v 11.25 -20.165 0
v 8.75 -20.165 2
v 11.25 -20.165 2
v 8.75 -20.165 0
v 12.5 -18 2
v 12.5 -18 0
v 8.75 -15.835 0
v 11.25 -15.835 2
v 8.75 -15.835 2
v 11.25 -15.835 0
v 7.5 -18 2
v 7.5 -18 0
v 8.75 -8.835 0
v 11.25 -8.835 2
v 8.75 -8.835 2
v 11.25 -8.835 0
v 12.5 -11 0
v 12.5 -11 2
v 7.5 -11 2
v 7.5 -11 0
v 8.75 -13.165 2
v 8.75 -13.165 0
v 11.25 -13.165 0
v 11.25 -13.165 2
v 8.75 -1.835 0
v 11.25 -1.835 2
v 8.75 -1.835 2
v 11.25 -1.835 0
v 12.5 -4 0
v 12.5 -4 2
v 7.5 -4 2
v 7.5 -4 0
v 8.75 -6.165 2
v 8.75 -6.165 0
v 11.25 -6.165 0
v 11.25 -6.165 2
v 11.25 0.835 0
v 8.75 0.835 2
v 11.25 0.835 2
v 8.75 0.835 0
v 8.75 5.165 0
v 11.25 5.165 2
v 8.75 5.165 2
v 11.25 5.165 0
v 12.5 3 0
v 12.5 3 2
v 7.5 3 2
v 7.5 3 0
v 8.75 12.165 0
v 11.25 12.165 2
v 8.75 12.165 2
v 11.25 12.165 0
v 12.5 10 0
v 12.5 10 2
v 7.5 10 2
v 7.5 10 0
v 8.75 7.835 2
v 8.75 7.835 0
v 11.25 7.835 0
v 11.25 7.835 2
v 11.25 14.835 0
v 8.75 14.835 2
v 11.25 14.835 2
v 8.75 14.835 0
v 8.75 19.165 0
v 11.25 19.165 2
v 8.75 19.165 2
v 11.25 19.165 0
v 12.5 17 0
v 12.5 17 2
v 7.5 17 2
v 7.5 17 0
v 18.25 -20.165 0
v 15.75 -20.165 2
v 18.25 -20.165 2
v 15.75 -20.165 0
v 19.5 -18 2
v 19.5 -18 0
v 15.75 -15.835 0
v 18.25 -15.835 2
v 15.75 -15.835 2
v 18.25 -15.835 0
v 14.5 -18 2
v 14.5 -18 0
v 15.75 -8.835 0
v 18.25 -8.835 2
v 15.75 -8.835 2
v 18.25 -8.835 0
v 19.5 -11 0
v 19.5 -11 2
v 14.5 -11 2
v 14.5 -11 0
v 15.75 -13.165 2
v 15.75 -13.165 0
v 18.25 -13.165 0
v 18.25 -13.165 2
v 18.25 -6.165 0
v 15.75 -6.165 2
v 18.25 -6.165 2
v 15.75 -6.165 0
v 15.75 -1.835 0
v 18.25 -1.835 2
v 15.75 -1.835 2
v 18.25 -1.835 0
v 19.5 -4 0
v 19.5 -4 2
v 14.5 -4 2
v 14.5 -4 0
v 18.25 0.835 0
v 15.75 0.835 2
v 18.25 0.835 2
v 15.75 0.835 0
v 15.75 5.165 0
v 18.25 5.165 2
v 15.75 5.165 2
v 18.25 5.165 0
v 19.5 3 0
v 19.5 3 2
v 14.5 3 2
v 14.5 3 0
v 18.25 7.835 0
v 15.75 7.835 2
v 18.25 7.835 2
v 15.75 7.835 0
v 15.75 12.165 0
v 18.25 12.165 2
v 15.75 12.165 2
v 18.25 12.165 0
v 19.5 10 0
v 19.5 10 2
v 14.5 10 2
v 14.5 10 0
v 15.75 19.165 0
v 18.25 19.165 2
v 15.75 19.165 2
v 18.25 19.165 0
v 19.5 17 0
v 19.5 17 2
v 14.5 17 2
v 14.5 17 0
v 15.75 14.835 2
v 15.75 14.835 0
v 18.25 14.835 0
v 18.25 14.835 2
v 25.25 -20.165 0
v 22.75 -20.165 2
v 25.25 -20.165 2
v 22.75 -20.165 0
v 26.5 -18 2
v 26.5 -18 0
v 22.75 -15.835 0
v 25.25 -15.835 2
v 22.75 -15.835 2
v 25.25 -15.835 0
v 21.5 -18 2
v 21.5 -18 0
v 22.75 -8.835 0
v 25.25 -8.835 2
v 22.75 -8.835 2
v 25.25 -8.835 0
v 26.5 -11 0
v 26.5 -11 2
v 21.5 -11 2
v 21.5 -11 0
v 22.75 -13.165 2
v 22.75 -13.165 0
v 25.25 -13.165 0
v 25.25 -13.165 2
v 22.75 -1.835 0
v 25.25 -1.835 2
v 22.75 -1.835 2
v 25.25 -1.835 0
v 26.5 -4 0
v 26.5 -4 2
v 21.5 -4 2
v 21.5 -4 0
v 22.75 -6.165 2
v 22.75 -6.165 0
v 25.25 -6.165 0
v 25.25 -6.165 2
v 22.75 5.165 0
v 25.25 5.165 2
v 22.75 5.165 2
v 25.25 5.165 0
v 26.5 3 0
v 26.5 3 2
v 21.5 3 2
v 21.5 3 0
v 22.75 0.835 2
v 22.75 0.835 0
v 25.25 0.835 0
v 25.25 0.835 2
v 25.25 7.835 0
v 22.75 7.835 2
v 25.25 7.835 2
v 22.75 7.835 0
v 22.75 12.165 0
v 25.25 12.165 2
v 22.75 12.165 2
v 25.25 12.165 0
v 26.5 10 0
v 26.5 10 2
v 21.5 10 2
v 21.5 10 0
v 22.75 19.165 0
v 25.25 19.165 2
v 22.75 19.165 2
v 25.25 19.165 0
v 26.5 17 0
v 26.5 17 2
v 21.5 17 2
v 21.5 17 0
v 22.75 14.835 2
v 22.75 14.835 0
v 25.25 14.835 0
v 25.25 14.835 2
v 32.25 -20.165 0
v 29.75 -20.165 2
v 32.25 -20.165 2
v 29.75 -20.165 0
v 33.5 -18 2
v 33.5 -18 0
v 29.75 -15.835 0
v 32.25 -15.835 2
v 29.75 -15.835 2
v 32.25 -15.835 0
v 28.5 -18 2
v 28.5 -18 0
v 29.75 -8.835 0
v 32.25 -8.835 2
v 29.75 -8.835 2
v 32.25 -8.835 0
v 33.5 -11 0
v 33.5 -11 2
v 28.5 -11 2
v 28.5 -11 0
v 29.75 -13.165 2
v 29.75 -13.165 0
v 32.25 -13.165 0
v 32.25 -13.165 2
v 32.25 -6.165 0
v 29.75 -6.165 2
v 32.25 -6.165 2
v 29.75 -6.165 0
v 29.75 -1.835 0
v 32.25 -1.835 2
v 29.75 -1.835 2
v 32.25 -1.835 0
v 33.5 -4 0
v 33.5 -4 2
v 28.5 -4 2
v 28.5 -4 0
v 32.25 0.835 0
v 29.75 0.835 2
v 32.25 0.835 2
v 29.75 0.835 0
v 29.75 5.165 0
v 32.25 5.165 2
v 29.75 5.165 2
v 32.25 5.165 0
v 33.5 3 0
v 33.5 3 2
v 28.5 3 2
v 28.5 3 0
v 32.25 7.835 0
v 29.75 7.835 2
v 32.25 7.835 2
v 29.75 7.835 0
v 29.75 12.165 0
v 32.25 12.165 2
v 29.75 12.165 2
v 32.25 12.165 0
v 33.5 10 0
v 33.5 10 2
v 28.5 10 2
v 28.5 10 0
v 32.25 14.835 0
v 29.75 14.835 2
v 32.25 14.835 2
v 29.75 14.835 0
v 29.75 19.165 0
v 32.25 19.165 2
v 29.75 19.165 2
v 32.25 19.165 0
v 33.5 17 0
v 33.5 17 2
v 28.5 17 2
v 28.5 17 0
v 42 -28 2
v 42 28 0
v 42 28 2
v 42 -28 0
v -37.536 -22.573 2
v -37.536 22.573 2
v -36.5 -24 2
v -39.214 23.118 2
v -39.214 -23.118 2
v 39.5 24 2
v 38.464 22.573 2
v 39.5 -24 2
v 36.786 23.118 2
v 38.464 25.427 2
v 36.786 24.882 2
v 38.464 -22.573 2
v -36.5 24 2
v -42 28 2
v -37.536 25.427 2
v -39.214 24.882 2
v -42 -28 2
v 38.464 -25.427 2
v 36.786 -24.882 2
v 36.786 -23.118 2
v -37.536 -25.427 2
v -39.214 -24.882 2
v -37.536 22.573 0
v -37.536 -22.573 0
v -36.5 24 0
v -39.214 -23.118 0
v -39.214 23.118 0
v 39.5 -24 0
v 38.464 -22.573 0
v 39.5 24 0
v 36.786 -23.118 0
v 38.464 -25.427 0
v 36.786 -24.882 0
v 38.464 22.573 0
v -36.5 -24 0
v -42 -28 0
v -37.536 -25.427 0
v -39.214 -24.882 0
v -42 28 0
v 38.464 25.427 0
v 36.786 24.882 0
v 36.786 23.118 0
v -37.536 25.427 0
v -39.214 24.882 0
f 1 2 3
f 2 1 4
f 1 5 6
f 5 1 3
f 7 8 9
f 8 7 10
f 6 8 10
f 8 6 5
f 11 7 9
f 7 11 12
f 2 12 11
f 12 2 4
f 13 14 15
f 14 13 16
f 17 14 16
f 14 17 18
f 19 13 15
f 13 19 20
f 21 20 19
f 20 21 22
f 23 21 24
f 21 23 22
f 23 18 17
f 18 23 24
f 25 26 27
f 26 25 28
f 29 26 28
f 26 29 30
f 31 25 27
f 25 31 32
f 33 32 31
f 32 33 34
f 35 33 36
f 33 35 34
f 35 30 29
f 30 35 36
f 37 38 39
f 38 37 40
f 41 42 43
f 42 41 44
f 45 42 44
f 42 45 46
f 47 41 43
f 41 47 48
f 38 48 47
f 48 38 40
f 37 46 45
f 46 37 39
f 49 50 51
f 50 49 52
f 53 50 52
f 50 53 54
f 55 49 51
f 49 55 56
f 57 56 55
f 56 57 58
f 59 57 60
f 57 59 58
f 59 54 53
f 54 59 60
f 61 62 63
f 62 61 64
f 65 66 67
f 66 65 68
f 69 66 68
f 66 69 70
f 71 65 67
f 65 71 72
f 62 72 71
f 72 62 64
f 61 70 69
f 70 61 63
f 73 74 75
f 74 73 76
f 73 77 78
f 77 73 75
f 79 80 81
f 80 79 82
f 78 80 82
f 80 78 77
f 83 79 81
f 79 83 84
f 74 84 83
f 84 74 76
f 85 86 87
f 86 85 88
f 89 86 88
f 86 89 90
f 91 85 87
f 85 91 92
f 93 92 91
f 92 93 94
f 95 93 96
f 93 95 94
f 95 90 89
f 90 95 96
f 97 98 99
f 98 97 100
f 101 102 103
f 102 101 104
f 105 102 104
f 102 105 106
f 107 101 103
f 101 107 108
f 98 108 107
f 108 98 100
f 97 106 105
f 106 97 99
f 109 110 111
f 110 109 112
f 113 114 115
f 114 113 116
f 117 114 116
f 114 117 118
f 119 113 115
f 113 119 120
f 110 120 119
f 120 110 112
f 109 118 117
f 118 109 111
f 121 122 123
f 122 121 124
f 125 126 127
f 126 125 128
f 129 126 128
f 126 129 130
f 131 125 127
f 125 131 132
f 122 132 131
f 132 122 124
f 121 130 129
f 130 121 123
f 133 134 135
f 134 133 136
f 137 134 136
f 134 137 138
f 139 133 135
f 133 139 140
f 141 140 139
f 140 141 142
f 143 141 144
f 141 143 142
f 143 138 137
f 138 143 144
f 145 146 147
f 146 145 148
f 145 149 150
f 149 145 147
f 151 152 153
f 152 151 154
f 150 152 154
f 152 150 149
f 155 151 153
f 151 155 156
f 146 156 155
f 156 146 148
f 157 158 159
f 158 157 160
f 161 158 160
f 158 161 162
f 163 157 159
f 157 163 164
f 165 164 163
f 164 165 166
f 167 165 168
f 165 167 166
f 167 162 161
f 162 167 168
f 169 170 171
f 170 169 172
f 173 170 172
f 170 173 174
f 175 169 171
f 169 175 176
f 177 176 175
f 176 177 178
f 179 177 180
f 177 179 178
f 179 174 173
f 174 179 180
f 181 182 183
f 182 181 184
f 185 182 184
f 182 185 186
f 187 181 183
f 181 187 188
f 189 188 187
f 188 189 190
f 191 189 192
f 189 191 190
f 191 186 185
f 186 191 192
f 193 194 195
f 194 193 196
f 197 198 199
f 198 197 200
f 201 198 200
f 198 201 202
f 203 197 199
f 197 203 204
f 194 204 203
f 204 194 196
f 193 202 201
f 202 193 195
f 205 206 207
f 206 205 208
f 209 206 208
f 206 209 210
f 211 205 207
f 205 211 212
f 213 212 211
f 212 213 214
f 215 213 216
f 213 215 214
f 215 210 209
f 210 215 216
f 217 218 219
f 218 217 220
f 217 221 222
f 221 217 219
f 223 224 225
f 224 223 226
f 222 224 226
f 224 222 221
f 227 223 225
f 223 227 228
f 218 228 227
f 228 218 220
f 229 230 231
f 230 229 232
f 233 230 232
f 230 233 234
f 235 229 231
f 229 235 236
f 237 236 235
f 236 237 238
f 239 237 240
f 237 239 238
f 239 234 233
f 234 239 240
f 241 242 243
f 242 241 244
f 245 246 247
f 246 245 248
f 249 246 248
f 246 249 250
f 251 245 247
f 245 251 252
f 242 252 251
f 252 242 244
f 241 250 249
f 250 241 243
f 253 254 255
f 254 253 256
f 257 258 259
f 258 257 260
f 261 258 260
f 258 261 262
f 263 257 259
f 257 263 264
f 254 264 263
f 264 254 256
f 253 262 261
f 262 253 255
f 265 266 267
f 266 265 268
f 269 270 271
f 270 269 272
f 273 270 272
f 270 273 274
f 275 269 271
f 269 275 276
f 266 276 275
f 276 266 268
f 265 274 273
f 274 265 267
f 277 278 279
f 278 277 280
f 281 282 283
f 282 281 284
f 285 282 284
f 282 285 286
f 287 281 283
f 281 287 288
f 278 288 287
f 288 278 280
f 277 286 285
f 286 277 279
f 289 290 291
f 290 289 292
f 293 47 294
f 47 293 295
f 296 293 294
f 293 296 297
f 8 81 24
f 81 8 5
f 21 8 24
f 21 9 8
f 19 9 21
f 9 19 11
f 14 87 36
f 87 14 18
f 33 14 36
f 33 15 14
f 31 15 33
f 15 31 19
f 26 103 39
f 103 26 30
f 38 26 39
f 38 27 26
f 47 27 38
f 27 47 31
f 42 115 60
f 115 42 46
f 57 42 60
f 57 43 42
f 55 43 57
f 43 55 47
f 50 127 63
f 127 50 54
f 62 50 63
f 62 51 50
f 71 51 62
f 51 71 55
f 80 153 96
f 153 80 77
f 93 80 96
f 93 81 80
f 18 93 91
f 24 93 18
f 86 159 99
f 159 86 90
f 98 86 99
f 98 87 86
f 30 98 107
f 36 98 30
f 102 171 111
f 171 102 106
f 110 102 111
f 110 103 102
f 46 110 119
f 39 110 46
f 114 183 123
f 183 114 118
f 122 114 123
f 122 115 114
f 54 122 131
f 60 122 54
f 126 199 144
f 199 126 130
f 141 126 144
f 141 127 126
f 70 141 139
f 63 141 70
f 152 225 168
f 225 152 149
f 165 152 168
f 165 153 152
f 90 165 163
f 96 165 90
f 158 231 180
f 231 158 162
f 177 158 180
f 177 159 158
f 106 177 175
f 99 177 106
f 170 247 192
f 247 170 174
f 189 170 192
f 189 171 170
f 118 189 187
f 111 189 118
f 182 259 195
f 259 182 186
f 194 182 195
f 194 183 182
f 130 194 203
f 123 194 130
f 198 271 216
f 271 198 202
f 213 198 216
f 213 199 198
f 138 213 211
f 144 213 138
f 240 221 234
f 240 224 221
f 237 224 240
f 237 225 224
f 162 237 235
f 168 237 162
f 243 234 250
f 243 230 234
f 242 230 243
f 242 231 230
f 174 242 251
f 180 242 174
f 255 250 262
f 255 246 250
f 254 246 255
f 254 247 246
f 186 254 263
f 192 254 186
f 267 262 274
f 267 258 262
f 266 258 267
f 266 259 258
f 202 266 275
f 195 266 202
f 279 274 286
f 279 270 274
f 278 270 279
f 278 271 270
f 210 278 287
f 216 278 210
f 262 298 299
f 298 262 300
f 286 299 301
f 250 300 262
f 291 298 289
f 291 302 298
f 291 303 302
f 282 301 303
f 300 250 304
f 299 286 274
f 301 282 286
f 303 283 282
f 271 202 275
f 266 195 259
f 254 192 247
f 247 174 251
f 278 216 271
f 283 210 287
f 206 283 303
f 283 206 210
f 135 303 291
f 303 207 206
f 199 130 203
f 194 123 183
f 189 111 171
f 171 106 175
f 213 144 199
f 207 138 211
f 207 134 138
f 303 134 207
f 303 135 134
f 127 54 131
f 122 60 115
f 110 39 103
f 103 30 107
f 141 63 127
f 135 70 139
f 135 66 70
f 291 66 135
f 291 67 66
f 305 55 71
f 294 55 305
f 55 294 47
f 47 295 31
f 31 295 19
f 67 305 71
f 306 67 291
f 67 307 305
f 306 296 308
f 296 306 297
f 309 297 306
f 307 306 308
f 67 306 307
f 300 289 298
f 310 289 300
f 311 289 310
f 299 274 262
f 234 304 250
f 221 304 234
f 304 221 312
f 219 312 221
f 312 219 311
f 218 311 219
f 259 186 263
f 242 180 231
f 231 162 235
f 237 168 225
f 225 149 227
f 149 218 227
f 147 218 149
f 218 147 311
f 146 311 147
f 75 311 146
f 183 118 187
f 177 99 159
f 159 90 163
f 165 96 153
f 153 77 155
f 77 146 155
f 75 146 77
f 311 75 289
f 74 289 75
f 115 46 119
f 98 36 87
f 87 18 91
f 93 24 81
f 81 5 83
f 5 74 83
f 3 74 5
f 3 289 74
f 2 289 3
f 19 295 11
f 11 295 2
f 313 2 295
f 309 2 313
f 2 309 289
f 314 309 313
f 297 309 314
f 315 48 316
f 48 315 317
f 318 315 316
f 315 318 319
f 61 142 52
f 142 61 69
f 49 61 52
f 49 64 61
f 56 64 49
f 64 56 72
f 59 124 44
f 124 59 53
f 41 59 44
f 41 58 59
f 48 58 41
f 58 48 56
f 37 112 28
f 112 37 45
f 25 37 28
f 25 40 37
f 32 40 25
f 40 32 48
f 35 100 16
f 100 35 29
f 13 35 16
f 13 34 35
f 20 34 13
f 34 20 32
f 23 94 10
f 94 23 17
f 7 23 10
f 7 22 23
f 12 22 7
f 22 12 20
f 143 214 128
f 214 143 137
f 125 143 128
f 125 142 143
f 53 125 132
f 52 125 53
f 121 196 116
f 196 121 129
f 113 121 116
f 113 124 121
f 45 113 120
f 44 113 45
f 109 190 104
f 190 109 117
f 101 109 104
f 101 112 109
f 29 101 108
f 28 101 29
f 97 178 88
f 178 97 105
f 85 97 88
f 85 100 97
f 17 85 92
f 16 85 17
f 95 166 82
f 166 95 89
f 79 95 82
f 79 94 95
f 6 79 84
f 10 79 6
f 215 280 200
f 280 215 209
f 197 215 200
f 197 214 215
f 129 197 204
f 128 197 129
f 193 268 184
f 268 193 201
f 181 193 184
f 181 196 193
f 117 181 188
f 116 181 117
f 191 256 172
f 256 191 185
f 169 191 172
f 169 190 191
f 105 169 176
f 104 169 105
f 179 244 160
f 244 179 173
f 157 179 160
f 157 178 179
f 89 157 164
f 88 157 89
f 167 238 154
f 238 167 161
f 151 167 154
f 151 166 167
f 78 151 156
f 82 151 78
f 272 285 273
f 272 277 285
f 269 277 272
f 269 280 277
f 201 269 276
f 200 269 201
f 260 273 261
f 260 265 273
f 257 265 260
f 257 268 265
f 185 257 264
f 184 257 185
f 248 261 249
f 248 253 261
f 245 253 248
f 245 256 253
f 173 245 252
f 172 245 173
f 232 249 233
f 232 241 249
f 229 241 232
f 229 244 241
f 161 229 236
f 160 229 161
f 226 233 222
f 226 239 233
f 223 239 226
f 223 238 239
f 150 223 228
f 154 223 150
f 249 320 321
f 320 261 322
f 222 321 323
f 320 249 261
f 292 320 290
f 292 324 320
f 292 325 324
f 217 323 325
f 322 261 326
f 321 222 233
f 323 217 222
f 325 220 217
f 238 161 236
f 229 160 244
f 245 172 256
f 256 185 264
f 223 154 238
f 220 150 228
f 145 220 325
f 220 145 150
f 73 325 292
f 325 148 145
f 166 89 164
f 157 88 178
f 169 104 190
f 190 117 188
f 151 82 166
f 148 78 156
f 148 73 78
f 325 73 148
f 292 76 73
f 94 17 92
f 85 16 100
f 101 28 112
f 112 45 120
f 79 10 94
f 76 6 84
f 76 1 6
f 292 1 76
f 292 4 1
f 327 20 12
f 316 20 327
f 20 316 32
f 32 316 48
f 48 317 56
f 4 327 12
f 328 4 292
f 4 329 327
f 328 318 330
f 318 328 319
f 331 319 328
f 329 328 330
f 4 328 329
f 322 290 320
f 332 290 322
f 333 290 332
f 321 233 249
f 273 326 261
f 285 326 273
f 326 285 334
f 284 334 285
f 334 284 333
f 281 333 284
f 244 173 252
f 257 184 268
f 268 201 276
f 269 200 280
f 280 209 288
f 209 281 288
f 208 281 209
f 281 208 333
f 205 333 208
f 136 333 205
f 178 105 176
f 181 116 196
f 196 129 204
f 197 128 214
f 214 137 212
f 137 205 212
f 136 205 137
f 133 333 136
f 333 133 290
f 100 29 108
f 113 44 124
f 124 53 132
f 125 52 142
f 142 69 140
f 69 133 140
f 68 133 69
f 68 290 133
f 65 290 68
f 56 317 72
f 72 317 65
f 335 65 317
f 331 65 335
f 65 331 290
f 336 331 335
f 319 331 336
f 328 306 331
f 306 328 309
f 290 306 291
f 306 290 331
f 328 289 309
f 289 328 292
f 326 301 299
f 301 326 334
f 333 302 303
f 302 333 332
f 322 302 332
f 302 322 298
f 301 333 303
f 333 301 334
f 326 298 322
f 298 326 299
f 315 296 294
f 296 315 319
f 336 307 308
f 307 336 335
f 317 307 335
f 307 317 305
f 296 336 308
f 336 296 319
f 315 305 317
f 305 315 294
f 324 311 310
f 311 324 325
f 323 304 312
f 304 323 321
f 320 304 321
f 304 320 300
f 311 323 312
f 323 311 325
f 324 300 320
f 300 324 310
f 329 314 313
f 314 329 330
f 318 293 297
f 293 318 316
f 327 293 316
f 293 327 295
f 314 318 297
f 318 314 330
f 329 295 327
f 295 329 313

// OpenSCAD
top = 1; // 0-box only, 1-top only, 2-both  
mountsV=0; // enable vertical mounts
mountsH=0; // enable horisontal mounts
len = 80;   // internal length
width = 52;	 // internal width
height = 32; // internal height

p = 2;   // walls thickness
d = 6;   // racks diameter
k1 = 16; // diameter of hole in the racks
d1 = 3;  // depth of the hole in the racks

mLen = 12.5; 	// mounts length
mHeigh = 12.5; // mounts width
mHd = 3; 		// diameter of hole in the mounts

ghd = 5;  // gril hole diameter
ghs = 2; // gril hole space
ghr = 6; // gril hole resolution 3::8

module mount()
{
  	difference()
  	{
   	union()
  	  {
  		 cube([mLen - mHeigh / 2, mHeigh, p]);
		 translate([(mLen - mHeigh /2), mHeigh /2, 0])
  		 cylinder(p, d = mHeigh);
     }
 	  translate([(mLen - mHeigh /2), mHeigh /2, 0])
  	  cylinder(p, d = mHd);
   }
}

module mounp_pos(pos)
{
   if(pos == 0)
   {
   	rotate(180, 0, 0)
		translate([ (len + p) / 2, (-mHeigh/2), -(height+p) / 2])
		mount();
   } else if(pos == 1)
   {
   	rotate(90, 0, 0)
		translate([ (width + p) / 2, (-mHeigh/2), -(height+p) / 2])
		mount();
   } else if(pos == 2)
   {
   	translate([ (len + p) / 2, (-mHeigh/2), -(height+p) / 2])
		mount();
   } else if(pos == 3)
   {
  	   rotate(-90, 0, 0)
   	translate([ (width + p) / 2, (-mHeigh/2), -(height+p) / 2])
		mount();
   }
}

module corn(x, y)
{
  translate([(len/2 -d /3) * x, (width/2 - d/3) * y, p * 2])
  	difference()
  	{
 		cylinder(h = height/1.25, d = d, center=true);
   	translate([0, 0, height - k1])
  		cylinder(h = k1*2, d = d1, center=true);
   }
}


module box()
{
union() {  
   difference() {
 		cube([len + p * 2, width + p * 2, height + p], center = true);
		translate([0, 0, p]) {
	 		cube([len, width, height], center = true);
		}
  }
	corn(1, 1);
	corn(-1, 1);
	corn(1, -1);
	corn(-1, -1);
   if(mountsV)
   {
   	mounp_pos(0);
   	mounp_pos(2);
   }
   if(mountsH)
   {
   	mounp_pos(1);
   	mounp_pos(3);
	}
 }
}


module box_hole(x,y)
{
	translate([(len/2 -d /3) * x, (width/2 - d/3) * y, 0])
  		cylinder(h = p + 0.5, d = d1, center=true);
}

module gril(l, w)
{
	
	for(i = [0: ghd + ghs:l - ghd])
	{
		for(j = [0: ghd + ghs: w - ghd])
		{
			translate([i, j, 0])
				cylinder(h = k1*20, d = ghd, center=true, $fn=ghr);	
		}
	}
} 

module box_top() 
{
   difference() {
 		cube([len + p * 2, width + p * 2, p], center = true);
		box_hole(1, 1);
		box_hole(-1, 1);
		box_hole(1, -1);
		box_hole(-1, -1);
		if(ghd > 0) {
			translate([10, -18, 0]) gril(len / 3, 40);
		}
   }
}

if((top == 0) || (top == 2))
{
	box();
} 
if(top > 0)
{
	if(top == 2)
		translate([0, 0, (height + p + 6) / 2]) box_top();
	else
		translate([0, 0, p/2]) box_top();
}
